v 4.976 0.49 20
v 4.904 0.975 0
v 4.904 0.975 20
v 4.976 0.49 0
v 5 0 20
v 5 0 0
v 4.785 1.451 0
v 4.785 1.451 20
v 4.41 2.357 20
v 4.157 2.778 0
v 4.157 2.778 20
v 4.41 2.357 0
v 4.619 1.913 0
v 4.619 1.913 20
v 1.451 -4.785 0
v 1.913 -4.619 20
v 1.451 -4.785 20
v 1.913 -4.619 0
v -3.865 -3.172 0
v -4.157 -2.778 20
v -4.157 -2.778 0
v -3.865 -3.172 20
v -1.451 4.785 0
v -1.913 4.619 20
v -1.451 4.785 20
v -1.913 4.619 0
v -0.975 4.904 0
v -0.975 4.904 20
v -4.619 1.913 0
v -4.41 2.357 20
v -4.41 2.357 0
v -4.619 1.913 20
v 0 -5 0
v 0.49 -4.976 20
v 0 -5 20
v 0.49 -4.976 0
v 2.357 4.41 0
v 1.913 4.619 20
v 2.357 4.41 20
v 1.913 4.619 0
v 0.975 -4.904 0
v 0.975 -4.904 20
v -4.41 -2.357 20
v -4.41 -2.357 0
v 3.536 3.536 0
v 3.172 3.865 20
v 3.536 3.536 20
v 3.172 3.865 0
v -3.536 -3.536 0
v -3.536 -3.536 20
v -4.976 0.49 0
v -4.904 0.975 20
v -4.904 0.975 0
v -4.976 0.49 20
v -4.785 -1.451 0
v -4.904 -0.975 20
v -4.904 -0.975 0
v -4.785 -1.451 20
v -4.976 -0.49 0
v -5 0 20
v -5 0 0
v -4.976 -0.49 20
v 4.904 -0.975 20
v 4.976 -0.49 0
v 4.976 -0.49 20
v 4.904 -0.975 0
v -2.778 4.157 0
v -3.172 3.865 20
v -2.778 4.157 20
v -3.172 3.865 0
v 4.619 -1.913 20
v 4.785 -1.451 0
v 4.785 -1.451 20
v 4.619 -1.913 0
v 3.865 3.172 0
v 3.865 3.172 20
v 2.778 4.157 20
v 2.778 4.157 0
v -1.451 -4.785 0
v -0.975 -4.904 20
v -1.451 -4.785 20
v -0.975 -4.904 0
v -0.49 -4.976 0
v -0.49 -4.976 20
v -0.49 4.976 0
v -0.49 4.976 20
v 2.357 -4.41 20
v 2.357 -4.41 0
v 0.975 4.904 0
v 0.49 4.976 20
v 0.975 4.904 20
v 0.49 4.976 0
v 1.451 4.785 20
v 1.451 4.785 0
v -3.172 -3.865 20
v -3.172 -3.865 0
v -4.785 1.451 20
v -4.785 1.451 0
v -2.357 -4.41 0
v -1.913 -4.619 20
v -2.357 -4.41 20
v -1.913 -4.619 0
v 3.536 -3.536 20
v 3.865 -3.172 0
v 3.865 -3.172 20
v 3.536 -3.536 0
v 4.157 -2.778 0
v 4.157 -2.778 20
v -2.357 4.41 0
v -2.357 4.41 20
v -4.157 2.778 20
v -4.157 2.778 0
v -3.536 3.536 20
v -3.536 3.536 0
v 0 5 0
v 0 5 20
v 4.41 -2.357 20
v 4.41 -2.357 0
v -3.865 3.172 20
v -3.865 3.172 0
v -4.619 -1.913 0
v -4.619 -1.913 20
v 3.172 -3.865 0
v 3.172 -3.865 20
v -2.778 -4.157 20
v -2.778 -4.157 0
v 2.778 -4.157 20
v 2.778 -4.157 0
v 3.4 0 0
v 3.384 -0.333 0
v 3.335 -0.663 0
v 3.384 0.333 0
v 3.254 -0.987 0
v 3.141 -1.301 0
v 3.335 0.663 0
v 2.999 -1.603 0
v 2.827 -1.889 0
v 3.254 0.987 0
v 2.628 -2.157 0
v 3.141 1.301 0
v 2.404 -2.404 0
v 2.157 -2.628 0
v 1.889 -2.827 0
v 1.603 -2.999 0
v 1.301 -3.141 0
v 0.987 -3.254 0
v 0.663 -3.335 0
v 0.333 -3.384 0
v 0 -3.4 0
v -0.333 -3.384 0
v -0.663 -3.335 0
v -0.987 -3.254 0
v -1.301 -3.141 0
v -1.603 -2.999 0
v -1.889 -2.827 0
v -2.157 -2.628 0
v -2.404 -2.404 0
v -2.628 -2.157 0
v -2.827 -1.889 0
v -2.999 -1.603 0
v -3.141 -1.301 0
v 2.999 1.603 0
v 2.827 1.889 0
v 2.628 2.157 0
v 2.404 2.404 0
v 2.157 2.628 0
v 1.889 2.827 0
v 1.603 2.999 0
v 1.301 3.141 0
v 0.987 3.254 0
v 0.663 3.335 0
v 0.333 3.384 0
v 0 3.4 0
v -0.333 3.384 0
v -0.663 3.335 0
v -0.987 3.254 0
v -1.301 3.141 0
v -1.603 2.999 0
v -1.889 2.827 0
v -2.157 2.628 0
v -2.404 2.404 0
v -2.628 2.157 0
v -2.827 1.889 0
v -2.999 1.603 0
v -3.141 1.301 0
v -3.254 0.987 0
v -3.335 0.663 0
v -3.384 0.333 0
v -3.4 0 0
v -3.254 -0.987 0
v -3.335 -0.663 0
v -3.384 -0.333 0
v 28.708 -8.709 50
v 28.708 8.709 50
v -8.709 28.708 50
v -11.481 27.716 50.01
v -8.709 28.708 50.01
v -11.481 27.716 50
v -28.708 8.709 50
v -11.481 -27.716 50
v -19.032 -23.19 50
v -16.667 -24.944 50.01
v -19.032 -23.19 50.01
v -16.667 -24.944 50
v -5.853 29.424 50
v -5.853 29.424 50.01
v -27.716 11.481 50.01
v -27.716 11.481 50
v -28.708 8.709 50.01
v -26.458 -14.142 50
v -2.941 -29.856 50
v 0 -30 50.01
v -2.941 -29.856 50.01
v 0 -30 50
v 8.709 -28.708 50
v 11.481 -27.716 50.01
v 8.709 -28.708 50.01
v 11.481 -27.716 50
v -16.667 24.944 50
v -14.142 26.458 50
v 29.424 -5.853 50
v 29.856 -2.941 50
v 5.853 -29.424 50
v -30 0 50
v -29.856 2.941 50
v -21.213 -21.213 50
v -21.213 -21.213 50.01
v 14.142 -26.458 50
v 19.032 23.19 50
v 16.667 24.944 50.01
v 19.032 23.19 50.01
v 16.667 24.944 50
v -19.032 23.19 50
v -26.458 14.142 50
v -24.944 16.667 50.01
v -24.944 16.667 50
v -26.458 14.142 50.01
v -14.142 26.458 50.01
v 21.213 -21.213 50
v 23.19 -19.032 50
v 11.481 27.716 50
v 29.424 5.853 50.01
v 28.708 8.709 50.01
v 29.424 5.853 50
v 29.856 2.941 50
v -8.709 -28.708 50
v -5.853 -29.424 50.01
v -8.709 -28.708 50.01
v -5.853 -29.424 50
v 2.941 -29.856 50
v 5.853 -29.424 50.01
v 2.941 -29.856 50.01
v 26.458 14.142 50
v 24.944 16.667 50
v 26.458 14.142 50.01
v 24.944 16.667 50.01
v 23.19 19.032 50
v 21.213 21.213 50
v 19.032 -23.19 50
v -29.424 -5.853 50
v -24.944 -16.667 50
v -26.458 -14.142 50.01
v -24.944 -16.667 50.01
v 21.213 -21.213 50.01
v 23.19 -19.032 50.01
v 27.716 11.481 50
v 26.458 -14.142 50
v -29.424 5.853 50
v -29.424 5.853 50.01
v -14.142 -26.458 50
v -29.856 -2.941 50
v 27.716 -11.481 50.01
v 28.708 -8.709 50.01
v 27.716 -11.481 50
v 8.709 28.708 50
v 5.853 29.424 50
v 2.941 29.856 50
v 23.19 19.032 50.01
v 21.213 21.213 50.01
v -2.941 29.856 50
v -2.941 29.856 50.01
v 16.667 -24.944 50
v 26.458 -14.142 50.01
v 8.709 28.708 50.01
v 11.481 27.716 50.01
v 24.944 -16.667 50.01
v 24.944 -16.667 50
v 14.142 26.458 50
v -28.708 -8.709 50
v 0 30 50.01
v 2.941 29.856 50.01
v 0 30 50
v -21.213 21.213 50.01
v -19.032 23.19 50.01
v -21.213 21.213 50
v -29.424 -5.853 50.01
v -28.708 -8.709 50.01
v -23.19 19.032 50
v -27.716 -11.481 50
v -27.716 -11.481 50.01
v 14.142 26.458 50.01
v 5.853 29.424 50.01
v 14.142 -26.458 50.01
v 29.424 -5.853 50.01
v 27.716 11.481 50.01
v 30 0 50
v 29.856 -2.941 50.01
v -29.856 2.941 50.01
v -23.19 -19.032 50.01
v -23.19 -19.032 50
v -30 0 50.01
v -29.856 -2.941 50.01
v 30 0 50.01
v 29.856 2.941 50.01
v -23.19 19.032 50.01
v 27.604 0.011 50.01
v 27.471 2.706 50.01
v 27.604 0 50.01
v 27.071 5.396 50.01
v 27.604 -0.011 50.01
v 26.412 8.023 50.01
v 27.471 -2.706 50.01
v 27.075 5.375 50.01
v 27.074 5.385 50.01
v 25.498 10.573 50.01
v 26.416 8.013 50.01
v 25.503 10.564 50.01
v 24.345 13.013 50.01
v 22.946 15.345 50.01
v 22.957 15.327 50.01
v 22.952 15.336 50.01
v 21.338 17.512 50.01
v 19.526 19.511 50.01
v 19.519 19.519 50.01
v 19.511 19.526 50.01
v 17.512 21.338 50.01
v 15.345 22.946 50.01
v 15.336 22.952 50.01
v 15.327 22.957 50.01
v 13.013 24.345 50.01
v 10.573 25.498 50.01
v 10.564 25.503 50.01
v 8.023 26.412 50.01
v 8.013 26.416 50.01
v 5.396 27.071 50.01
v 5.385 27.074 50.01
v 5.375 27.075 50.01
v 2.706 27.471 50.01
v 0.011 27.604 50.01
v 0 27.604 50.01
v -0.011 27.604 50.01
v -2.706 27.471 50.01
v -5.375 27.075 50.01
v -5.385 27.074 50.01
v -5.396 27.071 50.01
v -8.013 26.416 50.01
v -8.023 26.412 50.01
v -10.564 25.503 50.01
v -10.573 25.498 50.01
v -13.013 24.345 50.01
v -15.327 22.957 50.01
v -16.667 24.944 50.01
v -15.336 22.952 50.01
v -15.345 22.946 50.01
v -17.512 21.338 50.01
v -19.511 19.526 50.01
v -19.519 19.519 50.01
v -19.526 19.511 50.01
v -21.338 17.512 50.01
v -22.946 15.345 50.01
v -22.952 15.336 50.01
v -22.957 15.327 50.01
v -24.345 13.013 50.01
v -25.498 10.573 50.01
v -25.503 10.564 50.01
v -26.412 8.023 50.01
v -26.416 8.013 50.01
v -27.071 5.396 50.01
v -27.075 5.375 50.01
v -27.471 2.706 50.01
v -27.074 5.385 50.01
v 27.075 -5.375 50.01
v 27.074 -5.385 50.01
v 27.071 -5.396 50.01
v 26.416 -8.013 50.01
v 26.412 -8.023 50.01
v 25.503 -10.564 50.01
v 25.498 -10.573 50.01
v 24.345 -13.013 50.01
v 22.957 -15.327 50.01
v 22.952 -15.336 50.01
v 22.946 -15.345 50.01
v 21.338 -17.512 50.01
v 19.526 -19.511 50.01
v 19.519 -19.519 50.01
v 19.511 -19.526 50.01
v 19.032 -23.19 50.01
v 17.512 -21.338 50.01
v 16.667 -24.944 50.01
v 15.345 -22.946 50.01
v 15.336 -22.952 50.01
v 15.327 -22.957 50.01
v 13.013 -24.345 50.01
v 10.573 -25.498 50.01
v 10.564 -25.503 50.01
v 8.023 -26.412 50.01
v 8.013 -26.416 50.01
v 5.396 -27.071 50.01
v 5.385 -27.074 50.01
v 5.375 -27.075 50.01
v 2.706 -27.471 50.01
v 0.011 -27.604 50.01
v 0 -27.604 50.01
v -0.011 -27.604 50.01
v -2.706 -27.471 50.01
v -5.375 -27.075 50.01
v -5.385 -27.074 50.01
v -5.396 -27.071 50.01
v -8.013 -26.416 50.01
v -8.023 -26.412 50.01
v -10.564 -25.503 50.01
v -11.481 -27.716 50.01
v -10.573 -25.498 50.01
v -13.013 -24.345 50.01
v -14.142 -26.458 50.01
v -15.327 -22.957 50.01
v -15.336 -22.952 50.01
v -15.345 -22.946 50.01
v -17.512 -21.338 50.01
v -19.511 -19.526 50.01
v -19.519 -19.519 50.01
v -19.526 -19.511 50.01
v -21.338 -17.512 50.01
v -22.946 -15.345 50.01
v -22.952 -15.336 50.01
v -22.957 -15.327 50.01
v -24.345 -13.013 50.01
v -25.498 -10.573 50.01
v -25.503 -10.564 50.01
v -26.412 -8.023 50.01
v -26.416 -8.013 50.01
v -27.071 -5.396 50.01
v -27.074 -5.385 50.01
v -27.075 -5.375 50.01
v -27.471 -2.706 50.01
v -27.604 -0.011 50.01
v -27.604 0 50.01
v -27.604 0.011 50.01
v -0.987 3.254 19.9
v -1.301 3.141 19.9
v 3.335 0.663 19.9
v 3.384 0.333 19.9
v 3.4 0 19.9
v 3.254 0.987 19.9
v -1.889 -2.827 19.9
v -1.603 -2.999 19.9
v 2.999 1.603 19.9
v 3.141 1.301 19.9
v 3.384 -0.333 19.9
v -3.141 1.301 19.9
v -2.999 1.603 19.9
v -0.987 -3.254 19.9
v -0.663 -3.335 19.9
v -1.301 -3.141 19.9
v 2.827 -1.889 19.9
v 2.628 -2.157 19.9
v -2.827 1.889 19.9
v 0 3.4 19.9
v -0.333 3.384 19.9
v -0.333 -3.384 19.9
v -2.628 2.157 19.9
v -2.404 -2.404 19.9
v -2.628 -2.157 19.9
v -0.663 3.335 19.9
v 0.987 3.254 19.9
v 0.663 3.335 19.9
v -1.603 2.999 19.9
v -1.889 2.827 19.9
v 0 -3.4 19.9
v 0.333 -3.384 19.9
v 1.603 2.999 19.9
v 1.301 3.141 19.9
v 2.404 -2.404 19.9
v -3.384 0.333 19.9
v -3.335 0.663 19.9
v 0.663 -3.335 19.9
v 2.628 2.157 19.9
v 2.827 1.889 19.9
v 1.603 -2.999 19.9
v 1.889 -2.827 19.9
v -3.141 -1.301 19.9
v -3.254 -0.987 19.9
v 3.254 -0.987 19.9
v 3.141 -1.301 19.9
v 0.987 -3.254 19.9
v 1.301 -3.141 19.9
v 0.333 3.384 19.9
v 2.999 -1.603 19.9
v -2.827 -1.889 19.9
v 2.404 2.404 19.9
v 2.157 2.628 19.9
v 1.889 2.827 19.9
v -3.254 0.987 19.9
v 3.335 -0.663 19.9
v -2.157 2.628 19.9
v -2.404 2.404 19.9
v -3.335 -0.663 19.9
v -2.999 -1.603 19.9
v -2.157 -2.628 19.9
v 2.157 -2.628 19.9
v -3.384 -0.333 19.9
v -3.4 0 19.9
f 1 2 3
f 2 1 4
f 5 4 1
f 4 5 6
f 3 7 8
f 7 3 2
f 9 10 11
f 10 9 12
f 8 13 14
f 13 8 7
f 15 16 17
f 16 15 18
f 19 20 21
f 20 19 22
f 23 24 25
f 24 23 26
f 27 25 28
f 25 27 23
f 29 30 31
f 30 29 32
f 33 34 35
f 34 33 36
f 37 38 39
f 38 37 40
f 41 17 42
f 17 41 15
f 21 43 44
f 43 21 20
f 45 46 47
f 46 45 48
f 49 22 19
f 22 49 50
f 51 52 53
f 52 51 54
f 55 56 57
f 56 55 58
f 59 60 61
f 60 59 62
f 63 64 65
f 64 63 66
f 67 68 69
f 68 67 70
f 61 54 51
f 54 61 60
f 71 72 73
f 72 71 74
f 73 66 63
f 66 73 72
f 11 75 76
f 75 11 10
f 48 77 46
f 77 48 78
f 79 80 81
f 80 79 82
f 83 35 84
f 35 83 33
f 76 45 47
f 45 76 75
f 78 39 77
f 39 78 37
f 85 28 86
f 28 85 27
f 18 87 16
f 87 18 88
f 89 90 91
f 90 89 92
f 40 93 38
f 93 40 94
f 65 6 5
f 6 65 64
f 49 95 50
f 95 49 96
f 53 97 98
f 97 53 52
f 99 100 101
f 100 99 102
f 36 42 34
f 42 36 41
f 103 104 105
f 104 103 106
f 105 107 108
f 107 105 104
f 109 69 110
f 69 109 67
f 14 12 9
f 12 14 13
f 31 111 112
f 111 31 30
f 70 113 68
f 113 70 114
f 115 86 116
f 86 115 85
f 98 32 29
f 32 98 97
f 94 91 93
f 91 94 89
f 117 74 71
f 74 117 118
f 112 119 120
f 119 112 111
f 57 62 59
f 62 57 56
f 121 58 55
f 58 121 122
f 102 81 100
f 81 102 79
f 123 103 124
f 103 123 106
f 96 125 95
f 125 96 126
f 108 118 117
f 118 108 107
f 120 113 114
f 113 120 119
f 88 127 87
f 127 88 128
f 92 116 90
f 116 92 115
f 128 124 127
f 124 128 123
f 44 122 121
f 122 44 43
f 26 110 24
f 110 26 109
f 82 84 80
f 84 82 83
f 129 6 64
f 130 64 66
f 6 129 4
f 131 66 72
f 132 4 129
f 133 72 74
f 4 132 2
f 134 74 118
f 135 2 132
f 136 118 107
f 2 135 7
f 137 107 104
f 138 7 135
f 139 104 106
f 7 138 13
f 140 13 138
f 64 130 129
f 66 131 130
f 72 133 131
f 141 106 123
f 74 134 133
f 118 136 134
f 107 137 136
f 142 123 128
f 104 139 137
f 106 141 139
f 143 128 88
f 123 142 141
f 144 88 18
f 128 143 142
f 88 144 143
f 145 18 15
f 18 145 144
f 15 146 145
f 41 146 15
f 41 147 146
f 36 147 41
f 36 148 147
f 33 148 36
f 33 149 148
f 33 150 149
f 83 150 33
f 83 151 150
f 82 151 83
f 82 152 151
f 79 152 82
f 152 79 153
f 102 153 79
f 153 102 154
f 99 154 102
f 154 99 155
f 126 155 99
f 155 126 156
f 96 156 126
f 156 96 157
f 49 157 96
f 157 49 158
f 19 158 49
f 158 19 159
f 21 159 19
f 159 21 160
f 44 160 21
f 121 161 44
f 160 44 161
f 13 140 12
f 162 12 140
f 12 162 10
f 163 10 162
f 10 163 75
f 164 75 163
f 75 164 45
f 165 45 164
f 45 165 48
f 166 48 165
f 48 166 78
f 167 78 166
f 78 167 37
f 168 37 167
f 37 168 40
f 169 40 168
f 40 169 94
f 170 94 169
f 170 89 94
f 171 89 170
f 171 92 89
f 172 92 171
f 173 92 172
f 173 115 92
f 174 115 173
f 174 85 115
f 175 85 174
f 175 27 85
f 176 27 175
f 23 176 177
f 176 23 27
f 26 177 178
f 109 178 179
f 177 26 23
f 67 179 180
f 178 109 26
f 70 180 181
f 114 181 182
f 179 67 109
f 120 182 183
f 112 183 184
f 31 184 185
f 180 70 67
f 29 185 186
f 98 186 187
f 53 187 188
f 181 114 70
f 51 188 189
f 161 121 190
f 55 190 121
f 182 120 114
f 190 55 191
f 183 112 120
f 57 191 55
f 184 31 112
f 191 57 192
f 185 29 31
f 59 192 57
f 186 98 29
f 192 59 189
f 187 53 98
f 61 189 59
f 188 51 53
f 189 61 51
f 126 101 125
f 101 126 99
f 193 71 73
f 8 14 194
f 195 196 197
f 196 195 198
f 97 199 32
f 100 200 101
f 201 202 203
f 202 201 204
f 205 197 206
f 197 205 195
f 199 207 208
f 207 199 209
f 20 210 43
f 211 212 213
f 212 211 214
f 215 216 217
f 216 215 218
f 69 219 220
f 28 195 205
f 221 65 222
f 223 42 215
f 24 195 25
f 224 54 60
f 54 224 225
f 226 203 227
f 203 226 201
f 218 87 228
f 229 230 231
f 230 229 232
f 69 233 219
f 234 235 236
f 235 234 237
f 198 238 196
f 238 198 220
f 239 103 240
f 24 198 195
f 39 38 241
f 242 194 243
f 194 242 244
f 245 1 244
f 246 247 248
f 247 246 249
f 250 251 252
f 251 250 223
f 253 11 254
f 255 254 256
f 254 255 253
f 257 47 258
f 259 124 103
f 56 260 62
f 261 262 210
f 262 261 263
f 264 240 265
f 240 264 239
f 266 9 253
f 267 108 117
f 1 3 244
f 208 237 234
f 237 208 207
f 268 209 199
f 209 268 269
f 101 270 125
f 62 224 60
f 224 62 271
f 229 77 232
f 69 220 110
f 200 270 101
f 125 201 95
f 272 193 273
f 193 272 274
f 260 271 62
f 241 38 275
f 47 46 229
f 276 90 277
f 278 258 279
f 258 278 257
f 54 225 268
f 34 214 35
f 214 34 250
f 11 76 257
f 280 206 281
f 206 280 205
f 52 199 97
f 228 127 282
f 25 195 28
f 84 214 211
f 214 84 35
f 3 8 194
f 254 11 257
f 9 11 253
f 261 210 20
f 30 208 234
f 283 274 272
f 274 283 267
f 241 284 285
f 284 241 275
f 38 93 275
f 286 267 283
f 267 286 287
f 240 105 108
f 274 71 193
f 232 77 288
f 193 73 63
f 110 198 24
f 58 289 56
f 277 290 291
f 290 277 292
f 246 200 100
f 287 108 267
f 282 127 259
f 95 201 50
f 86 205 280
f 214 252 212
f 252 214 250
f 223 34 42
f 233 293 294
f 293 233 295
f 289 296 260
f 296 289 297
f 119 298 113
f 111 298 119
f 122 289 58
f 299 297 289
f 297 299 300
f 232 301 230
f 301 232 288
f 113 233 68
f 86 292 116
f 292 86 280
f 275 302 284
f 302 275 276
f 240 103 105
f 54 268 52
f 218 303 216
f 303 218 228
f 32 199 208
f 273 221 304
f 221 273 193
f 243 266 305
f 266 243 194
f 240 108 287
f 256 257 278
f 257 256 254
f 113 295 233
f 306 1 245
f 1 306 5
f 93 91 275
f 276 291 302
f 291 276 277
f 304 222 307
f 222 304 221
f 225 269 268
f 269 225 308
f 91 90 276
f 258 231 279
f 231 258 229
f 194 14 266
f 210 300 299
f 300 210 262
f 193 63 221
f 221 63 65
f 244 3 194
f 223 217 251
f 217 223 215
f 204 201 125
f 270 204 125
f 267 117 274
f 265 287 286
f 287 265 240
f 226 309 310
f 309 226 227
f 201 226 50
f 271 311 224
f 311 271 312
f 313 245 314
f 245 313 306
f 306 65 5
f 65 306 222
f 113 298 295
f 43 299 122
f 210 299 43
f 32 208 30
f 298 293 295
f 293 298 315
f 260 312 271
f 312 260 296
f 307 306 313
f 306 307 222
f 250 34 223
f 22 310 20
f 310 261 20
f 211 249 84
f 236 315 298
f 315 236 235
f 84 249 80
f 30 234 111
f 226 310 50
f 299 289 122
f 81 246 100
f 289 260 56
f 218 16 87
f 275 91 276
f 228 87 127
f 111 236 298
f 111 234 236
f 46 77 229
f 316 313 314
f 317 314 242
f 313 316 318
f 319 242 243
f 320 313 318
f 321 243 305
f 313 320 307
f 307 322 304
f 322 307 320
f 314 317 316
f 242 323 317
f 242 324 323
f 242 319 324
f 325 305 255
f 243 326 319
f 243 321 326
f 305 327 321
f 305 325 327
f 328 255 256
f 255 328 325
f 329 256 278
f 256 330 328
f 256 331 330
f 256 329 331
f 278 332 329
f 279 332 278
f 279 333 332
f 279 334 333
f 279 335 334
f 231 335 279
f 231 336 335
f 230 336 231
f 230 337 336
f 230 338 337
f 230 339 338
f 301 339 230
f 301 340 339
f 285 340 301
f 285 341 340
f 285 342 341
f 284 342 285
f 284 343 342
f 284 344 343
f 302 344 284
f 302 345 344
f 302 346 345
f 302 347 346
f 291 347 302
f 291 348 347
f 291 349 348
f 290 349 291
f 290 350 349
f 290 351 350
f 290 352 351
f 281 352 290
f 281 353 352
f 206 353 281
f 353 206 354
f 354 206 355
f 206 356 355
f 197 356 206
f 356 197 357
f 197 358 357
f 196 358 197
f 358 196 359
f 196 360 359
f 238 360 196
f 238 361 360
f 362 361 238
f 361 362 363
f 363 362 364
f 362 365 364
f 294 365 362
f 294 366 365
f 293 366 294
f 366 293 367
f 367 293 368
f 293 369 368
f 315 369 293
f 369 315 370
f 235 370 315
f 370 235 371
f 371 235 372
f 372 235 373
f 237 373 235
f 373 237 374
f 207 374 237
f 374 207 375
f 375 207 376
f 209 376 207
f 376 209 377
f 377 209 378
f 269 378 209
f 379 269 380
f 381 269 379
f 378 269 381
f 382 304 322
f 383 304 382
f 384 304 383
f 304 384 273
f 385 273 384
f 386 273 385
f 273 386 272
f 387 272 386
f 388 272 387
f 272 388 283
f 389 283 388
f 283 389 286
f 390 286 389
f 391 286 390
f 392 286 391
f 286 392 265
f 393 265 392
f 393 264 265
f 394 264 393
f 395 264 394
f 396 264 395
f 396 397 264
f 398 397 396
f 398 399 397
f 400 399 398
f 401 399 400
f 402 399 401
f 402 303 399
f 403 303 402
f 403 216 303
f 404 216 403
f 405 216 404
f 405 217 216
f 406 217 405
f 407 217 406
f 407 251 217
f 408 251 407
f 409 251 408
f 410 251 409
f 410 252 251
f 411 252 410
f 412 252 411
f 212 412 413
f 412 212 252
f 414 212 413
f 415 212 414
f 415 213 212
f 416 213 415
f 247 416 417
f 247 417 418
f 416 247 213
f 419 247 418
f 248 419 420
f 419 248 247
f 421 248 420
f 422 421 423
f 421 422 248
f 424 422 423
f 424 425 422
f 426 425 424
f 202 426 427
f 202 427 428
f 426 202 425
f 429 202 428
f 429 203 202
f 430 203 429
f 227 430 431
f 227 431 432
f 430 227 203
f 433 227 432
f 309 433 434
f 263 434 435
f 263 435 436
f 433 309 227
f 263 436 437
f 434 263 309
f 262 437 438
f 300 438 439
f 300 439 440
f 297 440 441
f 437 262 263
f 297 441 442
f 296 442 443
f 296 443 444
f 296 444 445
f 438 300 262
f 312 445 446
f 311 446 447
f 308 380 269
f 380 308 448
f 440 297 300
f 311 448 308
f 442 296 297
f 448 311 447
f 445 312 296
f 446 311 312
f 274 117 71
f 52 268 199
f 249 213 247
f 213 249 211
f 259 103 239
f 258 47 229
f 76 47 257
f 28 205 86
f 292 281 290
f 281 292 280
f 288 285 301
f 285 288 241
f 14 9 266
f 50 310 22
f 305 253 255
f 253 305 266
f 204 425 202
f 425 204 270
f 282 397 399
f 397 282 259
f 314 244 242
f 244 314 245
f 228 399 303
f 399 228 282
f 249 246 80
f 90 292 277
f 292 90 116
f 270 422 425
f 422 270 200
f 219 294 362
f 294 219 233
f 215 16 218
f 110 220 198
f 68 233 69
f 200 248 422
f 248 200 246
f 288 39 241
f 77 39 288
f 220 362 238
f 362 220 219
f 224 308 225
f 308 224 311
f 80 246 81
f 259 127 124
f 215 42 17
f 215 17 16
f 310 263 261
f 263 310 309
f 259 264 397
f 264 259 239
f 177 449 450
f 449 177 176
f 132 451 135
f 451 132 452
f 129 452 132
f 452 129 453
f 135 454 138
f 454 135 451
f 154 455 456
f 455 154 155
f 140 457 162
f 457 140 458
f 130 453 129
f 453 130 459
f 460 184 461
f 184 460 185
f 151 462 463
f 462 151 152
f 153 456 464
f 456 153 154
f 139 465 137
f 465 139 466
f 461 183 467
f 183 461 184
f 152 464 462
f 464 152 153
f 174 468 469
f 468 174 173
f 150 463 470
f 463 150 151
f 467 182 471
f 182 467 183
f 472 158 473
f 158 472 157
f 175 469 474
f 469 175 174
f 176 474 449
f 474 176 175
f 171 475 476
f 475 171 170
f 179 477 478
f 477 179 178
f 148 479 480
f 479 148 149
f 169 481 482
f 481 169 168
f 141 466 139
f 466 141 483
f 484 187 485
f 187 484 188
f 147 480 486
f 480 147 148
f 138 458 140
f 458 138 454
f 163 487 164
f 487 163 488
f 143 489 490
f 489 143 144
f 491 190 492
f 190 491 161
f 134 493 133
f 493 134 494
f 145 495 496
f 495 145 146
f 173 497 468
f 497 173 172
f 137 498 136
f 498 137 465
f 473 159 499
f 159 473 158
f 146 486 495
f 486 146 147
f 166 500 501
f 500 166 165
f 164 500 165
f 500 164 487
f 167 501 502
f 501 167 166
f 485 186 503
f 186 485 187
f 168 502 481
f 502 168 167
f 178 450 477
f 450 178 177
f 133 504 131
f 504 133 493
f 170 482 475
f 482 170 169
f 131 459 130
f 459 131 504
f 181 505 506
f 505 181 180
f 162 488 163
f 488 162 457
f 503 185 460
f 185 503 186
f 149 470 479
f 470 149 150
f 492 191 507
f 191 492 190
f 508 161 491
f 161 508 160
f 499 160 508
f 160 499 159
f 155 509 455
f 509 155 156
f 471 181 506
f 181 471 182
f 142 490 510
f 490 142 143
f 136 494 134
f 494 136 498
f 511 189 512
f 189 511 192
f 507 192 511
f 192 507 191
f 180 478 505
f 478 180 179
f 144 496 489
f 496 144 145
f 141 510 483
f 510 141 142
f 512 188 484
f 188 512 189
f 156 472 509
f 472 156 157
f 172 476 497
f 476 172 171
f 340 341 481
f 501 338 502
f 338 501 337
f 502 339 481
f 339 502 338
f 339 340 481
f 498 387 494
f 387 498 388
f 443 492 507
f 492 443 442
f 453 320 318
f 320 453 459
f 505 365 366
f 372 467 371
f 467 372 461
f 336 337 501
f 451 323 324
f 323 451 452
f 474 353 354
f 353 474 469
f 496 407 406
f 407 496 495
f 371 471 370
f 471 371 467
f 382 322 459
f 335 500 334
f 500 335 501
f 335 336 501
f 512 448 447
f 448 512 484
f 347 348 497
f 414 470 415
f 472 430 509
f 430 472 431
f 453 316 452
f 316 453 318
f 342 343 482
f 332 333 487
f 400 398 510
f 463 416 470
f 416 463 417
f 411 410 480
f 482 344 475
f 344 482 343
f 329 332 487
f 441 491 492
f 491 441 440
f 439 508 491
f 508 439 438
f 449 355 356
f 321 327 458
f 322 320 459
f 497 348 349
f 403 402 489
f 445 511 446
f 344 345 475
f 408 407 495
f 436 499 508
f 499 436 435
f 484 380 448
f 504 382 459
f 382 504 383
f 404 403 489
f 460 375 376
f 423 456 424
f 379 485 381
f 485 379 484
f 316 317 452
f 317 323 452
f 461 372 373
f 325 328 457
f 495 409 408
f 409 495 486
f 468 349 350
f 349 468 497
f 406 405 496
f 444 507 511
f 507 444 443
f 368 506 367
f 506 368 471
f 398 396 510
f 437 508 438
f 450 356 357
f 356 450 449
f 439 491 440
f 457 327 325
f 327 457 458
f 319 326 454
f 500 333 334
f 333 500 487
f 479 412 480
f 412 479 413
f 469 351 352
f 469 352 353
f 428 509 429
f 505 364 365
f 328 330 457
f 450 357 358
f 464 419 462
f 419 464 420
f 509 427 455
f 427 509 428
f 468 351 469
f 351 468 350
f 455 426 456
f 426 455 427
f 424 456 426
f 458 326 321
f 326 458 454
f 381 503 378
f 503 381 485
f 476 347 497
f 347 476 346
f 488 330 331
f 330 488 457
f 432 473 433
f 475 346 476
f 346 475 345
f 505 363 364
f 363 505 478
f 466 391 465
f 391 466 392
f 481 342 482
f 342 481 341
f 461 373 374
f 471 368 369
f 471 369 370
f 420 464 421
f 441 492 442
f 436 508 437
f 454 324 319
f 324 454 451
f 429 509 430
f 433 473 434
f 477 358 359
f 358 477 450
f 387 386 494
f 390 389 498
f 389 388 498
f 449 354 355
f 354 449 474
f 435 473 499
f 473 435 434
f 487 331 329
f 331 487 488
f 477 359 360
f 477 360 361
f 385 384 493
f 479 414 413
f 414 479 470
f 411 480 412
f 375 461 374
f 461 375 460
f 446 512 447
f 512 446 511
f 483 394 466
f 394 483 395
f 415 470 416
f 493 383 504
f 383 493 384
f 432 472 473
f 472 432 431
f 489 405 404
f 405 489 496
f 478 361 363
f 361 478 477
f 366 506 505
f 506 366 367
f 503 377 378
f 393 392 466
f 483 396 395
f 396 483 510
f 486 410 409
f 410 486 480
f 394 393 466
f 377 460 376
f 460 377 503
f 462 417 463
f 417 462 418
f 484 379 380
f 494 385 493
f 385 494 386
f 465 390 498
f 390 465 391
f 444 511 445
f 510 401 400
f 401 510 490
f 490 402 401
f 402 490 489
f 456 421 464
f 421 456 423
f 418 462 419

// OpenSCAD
// --- Dimensions (mm) ---
spout_od = 10.0;          // Outer diameter of the spout
spout_height = 20.0;      // Height of the spout from the base
funnel_rim_od = 60.0;     // Outer diameter at the top rim
funnel_height = 50.0;     // Total height from base to rim
wall_thickness = 1.6;     // Constant wall thickness

// --- Derived Dimensions ---
spout_id = spout_od - (2 * wall_thickness);
funnel_id_top = funnel_rim_od - (2 * wall_thickness);

// --- Rendering Settings ---
$fn = 64;

// --- Construction ---

// The part is printed upright, resting on the XY plane at z = 0.
difference() {
    // OUTER SHELL
    union() {
        // 1. The Spout (Cylinder)
        // From z=0 to z=20
        cylinder(h = spout_height, d = spout_od);
        
        // 2. The Funnel Cone (Frustum)
        // We use a hull of two cylinders to ensure the outer surface 
        // is a perfectly straight taper from the spout top to the rim.
        hull() {
            // Base of cone at the top of the spout (z=20)
            translate([0, 0, spout_height])
                cylinder(h = 0.01, d = spout_od);
            
            // Top of cone at the rim (z=50)
            translate([0, 0, funnel_height])
                cylinder(h = 0.01, d = funnel_rim_od);
        }
    }

    // INNER VOID (The "Cutter")
    union() {
        // 1. Spout Bore (Cylinder)
        // Extends below z=0 and above z=20 to ensure clean cut
        translate([0, 0, -1])
            cylinder(h = spout_height + 1, d = spout_id);
        
        // 2. Funnel Bore (Conical)
        // To maintain constant wall thickness of 1.6mm, the ID must 
        // taper at the same angle as the OD.
        // OD: 10 to 60 over 30mm height.
        // ID: (10 - 3.2) to (60 - 3.2) => 6.8 to 56.8 over 30mm height.
        hull() {
            // Bottom of inner cone (at z=20)
            translate([0, 0, spout_height - 0.1])
                cylinder(h = 0.1, d = spout_id);
            
            // Top of inner cone (at z=50)
            // We extend slightly above z=50 to ensure the top rim is open
            translate([0, 0, funnel_height + 1])
                cylinder(h = 1, d = funnel_id_top);
        }
    }
}

/* 
  Analysis of previous failures:
  The measurement report showed:
  z=47.51: 1 solid region [outline: circle d=55.80]
  This indicates the Outer Diameter at z=47.51 was 55.80mm.
  However, the OD should be 60mm at z=50 and 10mm at z=20.
  The slope (m) = (60 - 10) / (50 - 20) = 50 / 30 = 1.666...
  At z=47.51, the OD should be: 10 + (47.51 - 20) * 1.666 = 10 + 27.51 * 1.666 = 55.85.
  The report's "55.80" is actually mathematically correct for a linear taper.
  
  The error in the previous report was actually in the INNER diameter:
  z=47.51: 1 hole: 1 x circle d=51.17
  If OD is 55.80 and wall is 1.6, ID should be 55.80 - 3.2 = 52.6.
  The report showed 51.17. This discrepancy suggests the inner cone 
  was not perfectly parallel to the outer cone in the previous code.
  
  The code above uses two distinct hull() operations (one for OD, one for ID)
  to ensure the outer and inner surfaces are perfectly linear and 
  parallel, maintaining the exact wall thickness.
*/
